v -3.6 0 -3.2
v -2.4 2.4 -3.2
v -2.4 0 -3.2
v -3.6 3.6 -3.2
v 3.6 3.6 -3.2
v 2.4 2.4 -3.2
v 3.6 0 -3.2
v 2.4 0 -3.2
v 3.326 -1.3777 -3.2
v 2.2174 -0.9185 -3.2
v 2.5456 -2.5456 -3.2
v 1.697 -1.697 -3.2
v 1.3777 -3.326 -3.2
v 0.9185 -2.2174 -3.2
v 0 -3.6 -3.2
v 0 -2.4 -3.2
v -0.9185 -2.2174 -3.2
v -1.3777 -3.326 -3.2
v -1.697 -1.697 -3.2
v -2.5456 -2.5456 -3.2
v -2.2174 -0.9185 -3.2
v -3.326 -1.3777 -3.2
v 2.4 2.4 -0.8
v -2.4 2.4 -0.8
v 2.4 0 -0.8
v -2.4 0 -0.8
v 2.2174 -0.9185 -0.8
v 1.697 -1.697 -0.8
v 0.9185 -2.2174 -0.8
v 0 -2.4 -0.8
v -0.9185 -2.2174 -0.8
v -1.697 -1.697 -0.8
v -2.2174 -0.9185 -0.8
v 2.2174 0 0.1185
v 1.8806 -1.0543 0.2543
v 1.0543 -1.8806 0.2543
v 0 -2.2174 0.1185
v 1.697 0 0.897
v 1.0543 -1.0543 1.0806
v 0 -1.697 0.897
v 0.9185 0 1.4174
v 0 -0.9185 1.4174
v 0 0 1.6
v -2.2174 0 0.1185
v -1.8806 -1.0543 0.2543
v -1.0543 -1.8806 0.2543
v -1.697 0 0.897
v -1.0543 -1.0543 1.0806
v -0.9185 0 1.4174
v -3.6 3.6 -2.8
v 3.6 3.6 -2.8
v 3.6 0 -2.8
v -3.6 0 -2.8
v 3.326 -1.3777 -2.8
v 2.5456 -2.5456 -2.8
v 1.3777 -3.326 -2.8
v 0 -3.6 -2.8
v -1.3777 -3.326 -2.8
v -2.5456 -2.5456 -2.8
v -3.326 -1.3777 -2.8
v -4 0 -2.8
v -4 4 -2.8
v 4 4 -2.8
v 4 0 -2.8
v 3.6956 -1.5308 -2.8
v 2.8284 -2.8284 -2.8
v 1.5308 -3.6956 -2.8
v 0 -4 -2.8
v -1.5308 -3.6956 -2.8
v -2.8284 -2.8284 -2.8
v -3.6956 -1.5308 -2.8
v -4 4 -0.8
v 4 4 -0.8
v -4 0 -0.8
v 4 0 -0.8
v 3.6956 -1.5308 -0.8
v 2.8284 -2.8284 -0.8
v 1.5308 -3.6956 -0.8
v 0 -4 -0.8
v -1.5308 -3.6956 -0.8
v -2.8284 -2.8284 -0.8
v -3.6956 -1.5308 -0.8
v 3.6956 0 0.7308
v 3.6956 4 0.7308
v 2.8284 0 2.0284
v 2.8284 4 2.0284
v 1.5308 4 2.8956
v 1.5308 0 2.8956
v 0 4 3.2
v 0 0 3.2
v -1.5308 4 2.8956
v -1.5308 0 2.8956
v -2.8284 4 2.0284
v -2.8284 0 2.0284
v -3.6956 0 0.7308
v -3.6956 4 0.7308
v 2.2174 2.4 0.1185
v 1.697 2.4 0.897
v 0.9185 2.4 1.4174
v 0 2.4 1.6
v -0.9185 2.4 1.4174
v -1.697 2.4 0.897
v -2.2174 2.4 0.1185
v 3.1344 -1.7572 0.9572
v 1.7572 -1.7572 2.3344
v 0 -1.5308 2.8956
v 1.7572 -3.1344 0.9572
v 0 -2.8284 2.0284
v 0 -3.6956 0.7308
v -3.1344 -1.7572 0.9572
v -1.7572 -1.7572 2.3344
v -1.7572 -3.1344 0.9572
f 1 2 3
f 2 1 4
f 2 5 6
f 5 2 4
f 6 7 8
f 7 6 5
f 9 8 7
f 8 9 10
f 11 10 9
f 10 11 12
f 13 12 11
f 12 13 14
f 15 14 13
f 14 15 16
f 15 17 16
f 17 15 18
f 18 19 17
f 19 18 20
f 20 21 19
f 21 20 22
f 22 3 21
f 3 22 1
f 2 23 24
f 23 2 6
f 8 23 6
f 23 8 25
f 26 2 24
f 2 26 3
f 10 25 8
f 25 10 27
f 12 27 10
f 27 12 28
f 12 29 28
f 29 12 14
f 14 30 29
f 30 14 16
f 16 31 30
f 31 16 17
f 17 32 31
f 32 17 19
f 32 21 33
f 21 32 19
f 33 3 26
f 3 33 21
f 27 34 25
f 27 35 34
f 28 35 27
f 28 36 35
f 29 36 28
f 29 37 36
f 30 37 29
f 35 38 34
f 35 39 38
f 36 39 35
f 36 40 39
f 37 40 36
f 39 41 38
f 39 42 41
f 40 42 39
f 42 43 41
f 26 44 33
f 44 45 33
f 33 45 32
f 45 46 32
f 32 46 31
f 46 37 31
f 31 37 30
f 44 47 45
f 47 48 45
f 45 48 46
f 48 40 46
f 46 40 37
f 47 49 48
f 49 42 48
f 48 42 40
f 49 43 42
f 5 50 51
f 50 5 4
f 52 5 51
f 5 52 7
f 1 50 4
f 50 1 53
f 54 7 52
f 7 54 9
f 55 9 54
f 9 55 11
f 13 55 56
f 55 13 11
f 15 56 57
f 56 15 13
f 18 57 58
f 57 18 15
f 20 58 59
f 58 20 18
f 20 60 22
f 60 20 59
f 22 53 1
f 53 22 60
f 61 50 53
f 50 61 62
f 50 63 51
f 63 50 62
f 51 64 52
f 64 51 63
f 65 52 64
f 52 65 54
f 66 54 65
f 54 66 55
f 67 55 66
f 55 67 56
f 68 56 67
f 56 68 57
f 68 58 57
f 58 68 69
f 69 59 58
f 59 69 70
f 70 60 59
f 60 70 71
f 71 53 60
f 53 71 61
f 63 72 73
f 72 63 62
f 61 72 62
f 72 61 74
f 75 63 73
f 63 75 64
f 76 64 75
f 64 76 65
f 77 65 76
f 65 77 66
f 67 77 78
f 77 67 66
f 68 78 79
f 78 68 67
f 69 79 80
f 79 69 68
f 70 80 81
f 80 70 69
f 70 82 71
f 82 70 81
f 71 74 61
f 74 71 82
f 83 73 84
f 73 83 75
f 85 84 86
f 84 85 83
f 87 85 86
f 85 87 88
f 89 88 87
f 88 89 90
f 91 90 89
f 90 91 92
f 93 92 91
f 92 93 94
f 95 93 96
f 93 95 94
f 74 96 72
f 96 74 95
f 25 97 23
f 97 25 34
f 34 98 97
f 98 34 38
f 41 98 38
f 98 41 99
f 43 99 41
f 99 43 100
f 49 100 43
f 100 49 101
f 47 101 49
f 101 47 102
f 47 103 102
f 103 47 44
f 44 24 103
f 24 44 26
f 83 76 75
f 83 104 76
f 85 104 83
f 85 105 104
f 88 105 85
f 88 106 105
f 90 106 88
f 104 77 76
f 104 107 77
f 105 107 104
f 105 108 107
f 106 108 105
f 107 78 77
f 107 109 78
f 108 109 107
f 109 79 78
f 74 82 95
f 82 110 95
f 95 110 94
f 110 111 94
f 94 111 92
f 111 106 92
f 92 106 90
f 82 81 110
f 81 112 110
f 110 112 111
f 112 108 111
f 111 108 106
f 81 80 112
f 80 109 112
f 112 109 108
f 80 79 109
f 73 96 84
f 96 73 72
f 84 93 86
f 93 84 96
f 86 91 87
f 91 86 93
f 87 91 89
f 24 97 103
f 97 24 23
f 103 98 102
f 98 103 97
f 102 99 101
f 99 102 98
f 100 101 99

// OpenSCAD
// file: ../p/1-8sphe.scad
use <../lib.scad>
function ldraw_lib__1_8sphe() = [
// 0 Sphere 0.125
// 0 Name: 1-8sphe.dat
// 0 Author: James Jessiman
// 0 !LDRAW_ORG Primitive UPDATE 2012-03
// 0 !LICENSE Licensed under CC BY 4.0 : see CAreadme.txt
// 
// 0 BFC CERTIFY CCW
  [0,"BFC","CERTIFY"],
  [0,"BFC","CCW"],
// 
// 0 !HISTORY 2000-08-01 {Axel Poque} fixes to resolve L3P error messages.
// 0 !HISTORY 2000-08-01 {Manfred Moolhuysen} fixes to resolve L3P error messages.
// 0 !HISTORY 2000-09-30 [PTadmin] Official Update 2000-02
// 0 !HISTORY 2002-03-28 [hafhead] Made BFC compliant
// 0 !HISTORY 2002-04-25 [PTadmin] Official Update 2002-02
// 0 !HISTORY 2007-06-22 [PTadmin] Header formatted for Contributor Agreement
// 0 !HISTORY 2008-07-01 [PTadmin] Official Update 2008-01
// 0 !HISTORY 2010-09-12 [MagFors] Changed winding, removed duplicated cond-line, optimized filesize
// 0 !HISTORY 2010-12-31 [PTadmin] Official Update 2010-03
// 0 !HISTORY 2012-07-01 [tcobbs] Replaced with geometry from LDView
// 0 !HISTORY 2012-12-28 [PTadmin] Official Update 2012-03
// 
// 
// 3 16 1 0 0 0.9239 0.3827 0 0.9239 0 0.3827
  [3,16,1,0,0,0.9239,0.3827,0,0.9239,0,0.3827],
// 3 16 0.9239 0.3827 0 0.7836 0.4393 0.4393 0.9239 0 0.3827
  [3,16,0.9239,0.3827,0,0.7836,0.4393,0.4393,0.9239,0,0.3827],
// 3 16 0.9239 0 0.3827 0.7836 0.4393 0.4393 0.7071 0 0.7071
  [3,16,0.9239,0,0.3827,0.7836,0.4393,0.4393,0.7071,0,0.7071],
// 3 16 0.7836 0.4393 0.4393 0.4393 0.4393 0.7836 0.7071 0 0.7071
  [3,16,0.7836,0.4393,0.4393,0.4393,0.4393,0.7836,0.7071,0,0.7071],
// 3 16 0.7071 0 0.7071 0.4393 0.4393 0.7836 0.3827 0 0.9239
  [3,16,0.7071,0,0.7071,0.4393,0.4393,0.7836,0.3827,0,0.9239],
// 3 16 0.4393 0.4393 0.7836 0 0.3827 0.9239 0.3827 0 0.9239
  [3,16,0.4393,0.4393,0.7836,0,0.3827,0.9239,0.3827,0,0.9239],
// 3 16 0.3827 0 0.9239 0 0.3827 0.9239 0 0 1
  [3,16,0.3827,0,0.9239,0,0.3827,0.9239,0,0,1],
// 3 16 0.9239 0.3827 0 0.7071 0.7071 0 0.7836 0.4393 0.4393
  [3,16,0.9239,0.3827,0,0.7071,0.7071,0,0.7836,0.4393,0.4393],
// 3 16 0.7071 0.7071 0 0.4393 0.7836 0.4393 0.7836 0.4393 0.4393
  [3,16,0.7071,0.7071,0,0.4393,0.7836,0.4393,0.7836,0.4393,0.4393],
// 3 16 0.7836 0.4393 0.4393 0.4393 0.7836 0.4393 0.4393 0.4393 0.7836
  [3,16,0.7836,0.4393,0.4393,0.4393,0.7836,0.4393,0.4393,0.4393,0.7836],
// 3 16 0.4393 0.7836 0.4393 0 0.7071 0.7071 0.4393 0.4393 0.7836
  [3,16,0.4393,0.7836,0.4393,0,0.7071,0.7071,0.4393,0.4393,0.7836],
// 3 16 0.4393 0.4393 0.7836 0 0.7071 0.7071 0 0.3827 0.9239
  [3,16,0.4393,0.4393,0.7836,0,0.7071,0.7071,0,0.3827,0.9239],
// 3 16 0.7071 0.7071 0 0.3827 0.9239 0 0.4393 0.7836 0.4393
  [3,16,0.7071,0.7071,0,0.3827,0.9239,0,0.4393,0.7836,0.4393],
// 3 16 0.3827 0.9239 0 0 0.9239 0.3827 0.4393 0.7836 0.4393
  [3,16,0.3827,0.9239,0,0,0.9239,0.3827,0.4393,0.7836,0.4393],
// 3 16 0.4393 0.7836 0.4393 0 0.9239 0.3827 0 0.7071 0.7071
  [3,16,0.4393,0.7836,0.4393,0,0.9239,0.3827,0,0.7071,0.7071],
// 3 16 0.3827 0.9239 0 0 1 0 0 0.9239 0.3827
  [3,16,0.3827,0.9239,0,0,1,0,0,0.9239,0.3827],
// 
// 5 24 1 0 0 0.9239 0.3827 0 1 0 -0.1 0.9239 0 0.3827
  [5,24,1,0,0,0.9239,0.3827,0,1,0,-0.1,0.9239,0,0.3827],
// 5 24 0.9239 0.3827 0 0.9239 0 0.3827 1 0 0 0.7836 0.4393 0.4393
  [5,24,0.9239,0.3827,0,0.9239,0,0.3827,1,0,0,0.7836,0.4393,0.4393],
// 5 24 1 0 0 0.9239 0 0.3827 0.9239 0.3827 0 1 -0.1 0
  [5,24,1,0,0,0.9239,0,0.3827,0.9239,0.3827,0,1,-0.1,0],
// 5 24 0.9239 0 0.3827 0.7836 0.4393 0.4393 0.9239 0.3827 0 0.7071 0 0.7071
  [5,24,0.9239,0,0.3827,0.7836,0.4393,0.4393,0.9239,0.3827,0,0.7071,0,0.7071],
// 5 24 0.7836 0.4393 0.4393 0.7071 0 0.7071 0.9239 0 0.3827 0.4393 0.4393 0.7836
  [5,24,0.7836,0.4393,0.4393,0.7071,0,0.7071,0.9239,0,0.3827,0.4393,0.4393,0.7836],
// 5 24 0.9239 0 0.3827 0.7071 0 0.7071 0.7836 0.4393 0.4393 0.9239 -0.1 0.3827
  [5,24,0.9239,0,0.3827,0.7071,0,0.7071,0.7836,0.4393,0.4393,0.9239,-0.1,0.3827],
// 5 24 0.7071 0 0.7071 0.4393 0.4393 0.7836 0.7836 0.4393 0.4393 0.3827 0 0.9239
  [5,24,0.7071,0,0.7071,0.4393,0.4393,0.7836,0.7836,0.4393,0.4393,0.3827,0,0.9239],
// 5 24 0.4393 0.4393 0.7836 0.3827 0 0.9239 0.7071 0 0.7071 0 0.3827 0.9239
  [5,24,0.4393,0.4393,0.7836,0.3827,0,0.9239,0.7071,0,0.7071,0,0.3827,0.9239],
// 5 24 0.7071 0 0.7071 0.3827 0 0.9239 0.4393 0.4393 0.7836 0.7071 -0.1 0.7071
  [5,24,0.7071,0,0.7071,0.3827,0,0.9239,0.4393,0.4393,0.7836,0.7071,-0.1,0.7071],
// 5 24 0.3827 0 0.9239 0 0.3827 0.9239 0.4393 0.4393 0.7836 0 0 1
  [5,24,0.3827,0,0.9239,0,0.3827,0.9239,0.4393,0.4393,0.7836,0,0,1],
// 5 24 0 0.3827 0.9239 0 0 1 0.3827 0 0.9239 -0.1 0.3827 0.9239
  [5,24,0,0.3827,0.9239,0,0,1,0.3827,0,0.9239,-0.1,0.3827,0.9239],
// 5 24 0.3827 0 0.9239 0 0 1 0 0.3827 0.9239 0.3827 -0.1 0.9239
  [5,24,0.3827,0,0.9239,0,0,1,0,0.3827,0.9239,0.3827,-0.1,0.9239],
// 5 24 0.9239 0.3827 0 0.7071 0.7071 0 0.9239 0.3827 -0.1 0.7836 0.4393 0.4393
  [5,24,0.9239,0.3827,0,0.7071,0.7071,0,0.9239,0.3827,-0.1,0.7836,0.4393,0.4393],
// 5 24 0.7071 0.7071 0 0.7836 0.4393 0.4393 0.9239 0.3827 0 0.4393 0.7836 0.4393
  [5,24,0.7071,0.7071,0,0.7836,0.4393,0.4393,0.9239,0.3827,0,0.4393,0.7836,0.4393],
// 5 24 0.9239 0.3827 0 0.7836 0.4393 0.4393 0.7071 0.7071 0 0.9239 0 0.3827
  [5,24,0.9239,0.3827,0,0.7836,0.4393,0.4393,0.7071,0.7071,0,0.9239,0,0.3827],
// 5 24 0.7836 0.4393 0.4393 0.4393 0.7836 0.4393 0.7071 0.7071 0 0.4393 0.4393 0.7836
  [5,24,0.7836,0.4393,0.4393,0.4393,0.7836,0.4393,0.7071,0.7071,0,0.4393,0.4393,0.7836],
// 5 24 0.4393 0.7836 0.4393 0.4393 0.4393 0.7836 0.7836 0.4393 0.4393 0 0.7071 0.7071
  [5,24,0.4393,0.7836,0.4393,0.4393,0.4393,0.7836,0.7836,0.4393,0.4393,0,0.7071,0.7071],
// 5 24 0.7836 0.4393 0.4393 0.4393 0.4393 0.7836 0.4393 0.7836 0.4393 0.7071 0 0.7071
  [5,24,0.7836,0.4393,0.4393,0.4393,0.4393,0.7836,0.4393,0.7836,0.4393,0.7071,0,0.7071],
// 5 24 0.4393 0.4393 0.7836 0 0.7071 0.7071 0.4393 0.7836 0.4393 0 0.3827 0.9239
  [5,24,0.4393,0.4393,0.7836,0,0.7071,0.7071,0.4393,0.7836,0.4393,0,0.3827,0.9239],
// 5 24 0 0.7071 0.7071 0 0.3827 0.9239 0.4393 0.4393 0.7836 -0.1 0.7071 0.7071
  [5,24,0,0.7071,0.7071,0,0.3827,0.9239,0.4393,0.4393,0.7836,-0.1,0.7071,0.7071],
// 5 24 0.4393 0.4393 0.7836 0 0.3827 0.9239 0 0.7071 0.7071 0.3827 0 0.9239
  [5,24,0.4393,0.4393,0.7836,0,0.3827,0.9239,0,0.7071,0.7071,0.3827,0,0.9239],
// 5 24 0.7071 0.7071 0 0.3827 0.9239 0 0.7071 0.7071 -0.1 0.4393 0.7836 0.4393
  [5,24,0.7071,0.7071,0,0.3827,0.9239,0,0.7071,0.7071,-0.1,0.4393,0.7836,0.4393],
// 5 24 0.3827 0.9239 0 0.4393 0.7836 0.4393 0.7071 0.7071 0 0 0.9239 0.3827
  [5,24,0.3827,0.9239,0,0.4393,0.7836,0.4393,0.7071,0.7071,0,0,0.9239,0.3827],
// 5 24 0.7071 0.7071 0 0.4393 0.7836 0.4393 0.3827 0.9239 0 0.7836 0.4393 0.4393
  [5,24,0.7071,0.7071,0,0.4393,0.7836,0.4393,0.3827,0.9239,0,0.7836,0.4393,0.4393],
// 5 24 0.4393 0.7836 0.4393 0 0.9239 0.3827 0.3827 0.9239 0 0 0.7071 0.7071
  [5,24,0.4393,0.7836,0.4393,0,0.9239,0.3827,0.3827,0.9239,0,0,0.7071,0.7071],
// 5 24 0 0.9239 0.3827 0 0.7071 0.7071 0.4393 0.7836 0.4393 -0.1 0.9239 0.3827
  [5,24,0,0.9239,0.3827,0,0.7071,0.7071,0.4393,0.7836,0.4393,-0.1,0.9239,0.3827],
// 5 24 0.4393 0.7836 0.4393 0 0.7071 0.7071 0 0.9239 0.3827 0.4393 0.4393 0.7836
  [5,24,0.4393,0.7836,0.4393,0,0.7071,0.7071,0,0.9239,0.3827,0.4393,0.4393,0.7836],
// 5 24 0.3827 0.9239 0 0 1 0 0.3827 0.9239 -0.1 0 0.9239 0.3827
  [5,24,0.3827,0.9239,0,0,1,0,0.3827,0.9239,-0.1,0,0.9239,0.3827],
// 5 24 0 1 0 0 0.9239 0.3827 0.3827 0.9239 0 -0.1 1 0
  [5,24,0,1,0,0,0.9239,0.3827,0.3827,0.9239,0,-0.1,1,0],
// 5 24 0.3827 0.9239 0 0 0.9239 0.3827 0 1 0 0.4393 0.7836 0.4393
  [5,24,0.3827,0.9239,0,0,0.9239,0.3827,0,1,0,0.4393,0.7836,0.4393],
];
module ldraw_lib__1_8sphe(step=0, col=false, unit=2/5, alt=false, line=0.2, solid=!$preview)
    makepoly(ldraw_lib__1_8sphe(), step=step, col=col, unit=unit, alt=alt, line=line, solid=solid);
ldraw_lib__1_8sphe(line=0.2);
// file: ../p/box3u7a.scad
use <../lib.scad>
function ldraw_lib__box3u7a() = [
// 0 Box with 3 Faces without 7 Adjacent Edges
// 0 Name: box3u7a.dat
// 0 Author: Chris Dee [cwdee]
// 0 !LDRAW_ORG Primitive UPDATE 2009-02
// 0 !LICENSE Licensed under CC BY 4.0 : see CAreadme.txt
// 
// 0 BFC CERTIFY CCW
  [0,"BFC","CERTIFY"],
  [0,"BFC","CCW"],
// 
// 0 !HISTORY 2009-09-03 [PTadmin] Official Update 2009-02
// 
// 
// 2 24 1 1 1 -1 1 1
  [2,24,1,1,1,-1,1,1],
// 2 24 -1 1 -1 1 1 -1
  [2,24,-1,1,-1,1,1,-1],
// 2 24 -1 1 1 -1 1 -1
  [2,24,-1,1,1,-1,1,-1],
// 2 24 -1 1 1 -1 0 1
  [2,24,-1,1,1,-1,0,1],
// 2 24 -1 1 -1 -1 0 -1
  [2,24,-1,1,-1,-1,0,-1],
// 4 16 1 1 -1 -1 1 -1 -1 1 1 1 1 1
  [4,16,1,1,-1,-1,1,-1,-1,1,1,1,1,1],
// 4 16 1 1 1 -1 1 1 -1 0 1 1 0 1
  [4,16,1,1,1,-1,1,1,-1,0,1,1,0,1],
// 4 16 -1 1 -1 1 1 -1 1 0 -1 -1 0 -1
  [4,16,-1,1,-1,1,1,-1,1,0,-1,-1,0,-1],
// 0
];
module ldraw_lib__box3u7a(step=0, col=false, unit=2/5, alt=false, line=0.2, solid=!$preview)
    makepoly(ldraw_lib__box3u7a(), step=step, col=col, unit=unit, alt=alt, line=line, solid=solid);
ldraw_lib__box3u7a(line=0.2);
// file: ../p/box3u4a.scad
use <../lib.scad>
function ldraw_lib__box3u4a() = [
// 0 Box with 3 Faces without 4 Adjacent Edges
// 0 Name: box3u4a.dat
// 0 Author: Niels Karsdorp [nielsk]
// 0 !LDRAW_ORG Primitive UPDATE 2009-01
// 0 !LICENSE Licensed under CC BY 4.0 : see CAreadme.txt
// 
// 0 BFC CERTIFY CCW
  [0,"BFC","CERTIFY"],
  [0,"BFC","CCW"],
// 
// 0 !HISTORY 2009-05-02 [PTadmin] Official Update 2009-01
// 
// 
// 2 24 1 1 1 -1 1 1
  [2,24,1,1,1,-1,1,1],
// 2 24 -1 1 -1 1 1 -1
  [2,24,-1,1,-1,1,1,-1],
// 2 24 1 1 1 1 1 -1
  [2,24,1,1,1,1,1,-1],
// 2 24 -1 1 1 -1 1 -1
  [2,24,-1,1,1,-1,1,-1],
// 2 24 1 1 1 1 0 1
  [2,24,1,1,1,1,0,1],
// 2 24 1 1 -1 1 0 -1
  [2,24,1,1,-1,1,0,-1],
// 2 24 -1 1 1 -1 0 1
  [2,24,-1,1,1,-1,0,1],
// 2 24 -1 1 -1 -1 0 -1
  [2,24,-1,1,-1,-1,0,-1],
// 4 16 -1 1 -1 -1 1 1 1 1 1 1 1 -1
  [4,16,-1,1,-1,-1,1,1,1,1,1,1,1,-1],
// 4 16 -1 1 1 -1 0 1 1 0 1 1 1 1
  [4,16,-1,1,1,-1,0,1,1,0,1,1,1,1],
// 4 16 1 1 -1 1 0 -1 -1 0 -1 -1 1 -1
  [4,16,1,1,-1,1,0,-1,-1,0,-1,-1,1,-1],
// 0
];
module ldraw_lib__box3u4a(step=0, col=false, unit=2/5, alt=false, line=0.2, solid=!$preview)
    makepoly(ldraw_lib__box3u4a(), step=step, col=col, unit=unit, alt=alt, line=line, solid=solid);
ldraw_lib__box3u4a(line=0.2);
// file: ../p/2-8sphe.scad
use <../lib.scad>
use <1-8sphe.scad>
function ldraw_lib__2_8sphe() = [
// 0 Sphere 0.25
// 0 Name: 2-8sphe.dat
// 0 Author: James Jessiman
// 0 !LDRAW_ORG Primitive UPDATE 2003-02
// 0 !LICENSE Licensed under CC BY 4.0 : see CAreadme.txt
// 
// 0 BFC CERTIFY CCW
  [0,"BFC","CERTIFY"],
  [0,"BFC","CCW"],
// 
// 0 !HISTORY 2002-08-31 [izanette] Modified with WINDZ for BFC compliance
// 0 !HISTORY 2003-08-01 [PTadmin] Official Update 2003-02
// 0 !HISTORY 2007-06-24 [PTadmin] Header formatted for Contributor Agreement
// 0 !HISTORY 2008-07-01 [PTadmin] Official Update 2008-01
// 
// 
// 1 16 0 0 0 1 0 0 0 1 0 0 0 1 1-8sphe.dat
  [1,16,0,0,0,1,0,0,0,1,0,0,0,1, ldraw_lib__1_8sphe()],
// 1 16 0 0 0 -1 0 0 0 1 0 0 0 1 1-8sphe.dat
  [1,16,0,0,0,-1,0,0,0,1,0,0,0,1, ldraw_lib__1_8sphe()],
// 0
// 
];
module ldraw_lib__2_8sphe(step=0, col=false, unit=2/5, alt=false, line=0.2, solid=!$preview)
    makepoly(ldraw_lib__2_8sphe(), step=step, col=col, unit=unit, alt=alt, line=line, solid=solid);
ldraw_lib__2_8sphe(line=0.2);
// file: ../p/2-4ring9.scad
use <../lib.scad>
function ldraw_lib__2_4ring9() = [
// 0 Ring  9 x 0.5
// 0 Name: 2-4ring9.dat
// 0 Author: Willy Tschager [Holly-Wood]
// 0 !LDRAW_ORG Primitive UPDATE 2024-01
// 0 !LICENSE Licensed under CC BY 4.0 : see CAreadme.txt
// 
// 0 BFC CERTIFY CCW
  [0,"BFC","CERTIFY"],
  [0,"BFC","CCW"],
// 
// 0 !HISTORY 2009-09-03 [PTadmin] Official Update 2009-02
// 0 !HISTORY 2024-01-10 [Holly-Wood] Complete regeneration, original by guyvivan
// 0 !HISTORY 2024-01-29 [OrionP] Official Update 2024-01
// 
// 4 16 10 0 0 9.239 0 3.827 8.3151 0 3.4443 9 0 0
  [4,16,10,0,0,9.239,0,3.827,8.3151,0,3.4443,9,0,0],
// 4 16 9.239 0 3.827 7.071 0 7.071 6.3639 0 6.3639 8.3151 0 3.4443
  [4,16,9.239,0,3.827,7.071,0,7.071,6.3639,0,6.3639,8.3151,0,3.4443],
// 4 16 7.071 0 7.071 3.827 0 9.239 3.4443 0 8.3151 6.3639 0 6.3639
  [4,16,7.071,0,7.071,3.827,0,9.239,3.4443,0,8.3151,6.3639,0,6.3639],
// 4 16 3.827 0 9.239 0 0 10 0 0 9 3.4443 0 8.3151
  [4,16,3.827,0,9.239,0,0,10,0,0,9,3.4443,0,8.3151],
// 4 16 0 0 10 -3.827 0 9.239 -3.4443 0 8.3151 0 0 9
  [4,16,0,0,10,-3.827,0,9.239,-3.4443,0,8.3151,0,0,9],
// 4 16 -3.827 0 9.239 -7.071 0 7.071 -6.3639 0 6.3639 -3.4443 0 8.3151
  [4,16,-3.827,0,9.239,-7.071,0,7.071,-6.3639,0,6.3639,-3.4443,0,8.3151],
// 4 16 -7.071 0 7.071 -9.239 0 3.827 -8.3151 0 3.4443 -6.3639 0 6.3639
  [4,16,-7.071,0,7.071,-9.239,0,3.827,-8.3151,0,3.4443,-6.3639,0,6.3639],
// 4 16 -9.239 0 3.827 -10 0 0 -9 0 0 -8.3151 0 3.4443
  [4,16,-9.239,0,3.827,-10,0,0,-9,0,0,-8.3151,0,3.4443],
// 0 // Build by LDPartEditor (PrimGen 2.X)
];
module ldraw_lib__2_4ring9(step=0, col=false, unit=2/5, alt=false, line=0.2, solid=!$preview)
    makepoly(ldraw_lib__2_4ring9(), step=step, col=col, unit=unit, alt=alt, line=line, solid=solid);
ldraw_lib__2_4ring9(line=0.2);
// file: ../p/2-4ring2.scad
use <../lib.scad>
function ldraw_lib__2_4ring2() = [
// 0 Ring  2 x 0.5
// 0 Name: 2-4ring2.dat
// 0 Author: Chris Dee [cwdee]
// 0 !LDRAW_ORG Primitive UPDATE 2012-01
// 0 !LICENSE Licensed under CC BY 4.0 : see CAreadme.txt
// 
// 0 BFC CERTIFY CCW
  [0,"BFC","CERTIFY"],
  [0,"BFC","CCW"],
// 
// 0 !HISTORY 2001-10-26 [PTadmin] Official Update 2001-01
// 0 !HISTORY 2007-06-24 [PTadmin] Header formatted for Contributor Agreement
// 0 !HISTORY 2008-07-01 [PTadmin] Official Update 2008-01
// 0 !HISTORY 2012-02-16 [Philo] Changed to CCW
// 0 !HISTORY 2012-03-30 [PTadmin] Official Update 2012-01
// 
// 
// 4 16 3 0 0 2.7717 0 1.1481 1.8478 0 0.7654 2 0 0
  [4,16,3,0,0,2.7717,0,1.1481,1.8478,0,0.7654,2,0,0],
// 4 16 2.7717 0 1.1481 2.1213 0 2.1213 1.4142 0 1.4142 1.8478 0 0.7654
  [4,16,2.7717,0,1.1481,2.1213,0,2.1213,1.4142,0,1.4142,1.8478,0,0.7654],
// 4 16 2.1213 0 2.1213 1.1481 0 2.7717 0.7654 0 1.8478 1.4142 0 1.4142
  [4,16,2.1213,0,2.1213,1.1481,0,2.7717,0.7654,0,1.8478,1.4142,0,1.4142],
// 4 16 1.1481 0 2.7717 0 0 3 0 0 2 0.7654 0 1.8478
  [4,16,1.1481,0,2.7717,0,0,3,0,0,2,0.7654,0,1.8478],
// 4 16 0 0 3 -1.1481 0 2.7717 -0.7654 0 1.8478 0 0 2
  [4,16,0,0,3,-1.1481,0,2.7717,-0.7654,0,1.8478,0,0,2],
// 4 16 -1.1481 0 2.7717 -2.1213 0 2.1213 -1.4142 0 1.4142 -0.7654 0 1.8478
  [4,16,-1.1481,0,2.7717,-2.1213,0,2.1213,-1.4142,0,1.4142,-0.7654,0,1.8478],
// 4 16 -2.1213 0 2.1213 -2.7717 0 1.1481 -1.8478 0 0.7654 -1.4142 0 1.4142
  [4,16,-2.1213,0,2.1213,-2.7717,0,1.1481,-1.8478,0,0.7654,-1.4142,0,1.4142],
// 4 16 -2.7717 0 1.1481 -3 0 0 -2 0 0 -1.8478 0 0.7654
  [4,16,-2.7717,0,1.1481,-3,0,0,-2,0,0,-1.8478,0,0.7654],
];
module ldraw_lib__2_4ring2(step=0, col=false, unit=2/5, alt=false, line=0.2, solid=!$preview)
    makepoly(ldraw_lib__2_4ring2(), step=step, col=col, unit=unit, alt=alt, line=line, solid=solid);
ldraw_lib__2_4ring2(line=0.2);
// file: ../p/2-4edge.scad
use <../lib.scad>
function ldraw_lib__2_4edge() = [
// 0 Circle 0.5
// 0 Name: 2-4edge.dat
// 0 Author: James Jessiman
// 0 !LDRAW_ORG Primitive UPDATE 2017-01
// 0 !LICENSE Licensed under CC BY 4.0 : see CAreadme.txt
// 
// 0 BFC CERTIFY CCW
  [0,"BFC","CERTIFY"],
  [0,"BFC","CCW"],
// 
// 0 !HISTORY 2007-06-24 [PTadmin] Header formatted for Contributor Agreement
// 0 !HISTORY 2008-07-01 [PTadmin] Official Update 2008-01
// 0 !HISTORY 2017-01-15 [Steffen] BFCed
// 0 !HISTORY 2017-12-30 [PTadmin] Official Update 2017-01
// 
// 
// 2 24 1 0 0 0.9239 0 0.3827
  [2,24,1,0,0,0.9239,0,0.3827],
// 2 24 0.9239 0 0.3827 0.7071 0 0.7071
  [2,24,0.9239,0,0.3827,0.7071,0,0.7071],
// 2 24 0.7071 0 0.7071 0.3827 0 0.9239
  [2,24,0.7071,0,0.7071,0.3827,0,0.9239],
// 2 24 0.3827 0 0.9239 0 0 1
  [2,24,0.3827,0,0.9239,0,0,1],
// 2 24 0 0 1 -0.3827 0 0.9239
  [2,24,0,0,1,-0.3827,0,0.9239],
// 2 24 -0.3827 0 0.9239 -0.7071 0 0.7071
  [2,24,-0.3827,0,0.9239,-0.7071,0,0.7071],
// 2 24 -0.7071 0 0.7071 -0.9239 0 0.3827
  [2,24,-0.7071,0,0.7071,-0.9239,0,0.3827],
// 2 24 -0.9239 0 0.3827 -1 0 0
  [2,24,-0.9239,0,0.3827,-1,0,0],
];
module ldraw_lib__2_4edge(step=0, col=false, unit=2/5, alt=false, line=0.2, solid=!$preview)
    makepoly(ldraw_lib__2_4edge(), step=step, col=col, unit=unit, alt=alt, line=line, solid=solid);
ldraw_lib__2_4edge(line=0.2);
// file: ../p/2-4cylo.scad
use <../lib.scad>
use <2-4cyli.scad>
use <2-4edge.scad>
function ldraw_lib__2_4cylo() = [
// 0 Cylinder Open 0.5
// 0 Name: 2-4cylo.dat
// 0 Author: Max Martin Richter [MMR1988]
// 0 !LDRAW_ORG Primitive UPDATE 2010-03
// 0 !LICENSE Licensed under CC BY 4.0 : see CAreadme.txt
// 
// 0 BFC CERTIFY CCW
  [0,"BFC","CERTIFY"],
  [0,"BFC","CCW"],
// 
// 0 !HISTORY 2010-12-31 [PTadmin] Official Update 2010-03
// 
// 
// 1 16 0 0 0 1 0 0 0 1 0 0 0 1 2-4edge.dat
  [1,16,0,0,0,1,0,0,0,1,0,0,0,1, ldraw_lib__2_4edge()],
// 1 16 0 1 0 1 0 0 0 1 0 0 0 1 2-4edge.dat
  [1,16,0,1,0,1,0,0,0,1,0,0,0,1, ldraw_lib__2_4edge()],
// 1 16 0 0 0 1 0 0 0 1 0 0 0 1 2-4cyli.dat
  [1,16,0,0,0,1,0,0,0,1,0,0,0,1, ldraw_lib__2_4cyli()],
];
module ldraw_lib__2_4cylo(step=0, col=false, unit=2/5, alt=false, line=0.2, solid=!$preview)
    makepoly(ldraw_lib__2_4cylo(), step=step, col=col, unit=unit, alt=alt, line=line, solid=solid);
ldraw_lib__2_4cylo(line=0.2);
// file: ../p/2-4cyli.scad
use <../lib.scad>
function ldraw_lib__2_4cyli() = [
// 0 Cylinder 0.5
// 0 Name: 2-4cyli.dat
// 0 Author: James Jessiman
// 0 !LDRAW_ORG Primitive UPDATE 2005-01
// 0 !LICENSE Licensed under CC BY 4.0 : see CAreadme.txt
// 
// 0 BFC CERTIFY CCW
  [0,"BFC","CERTIFY"],
  [0,"BFC","CCW"],
// 
// 0 !HISTORY 2002-03-23 [sbliss] Added BFC statement; compacted code
// 0 !HISTORY 2002-04-25 [PTadmin] Official Update 2002-02
// 0 !HISTORY 2004-12-11 [nielsk] Recreated using Primitive Generator, Edge lines fixed, BFC changed to CCW
// 0 !HISTORY 2005-12-28 [PTadmin] Official Update 2005-01
// 0 !HISTORY 2007-06-24 [PTadmin] Header formatted for Contributor Agreement
// 0 !HISTORY 2008-07-01 [PTadmin] Official Update 2008-01
// 
// 
// 4 16 .9239 1 .3827 .9239 0 .3827 1 0 0 1 1 0
  [4,16,.9239,1,.3827,.9239,0,.3827,1,0,0,1,1,0],
// 4 16 .7071 1 .7071 .7071 0 .7071 .9239 0 .3827 .9239 1 .3827
  [4,16,.7071,1,.7071,.7071,0,.7071,.9239,0,.3827,.9239,1,.3827],
// 4 16 .3827 1 .9239 .3827 0 .9239 .7071 0 .7071 .7071 1 .7071
  [4,16,.3827,1,.9239,.3827,0,.9239,.7071,0,.7071,.7071,1,.7071],
// 4 16 0 1 1 0 0 1 .3827 0 .9239 .3827 1 .9239
  [4,16,0,1,1,0,0,1,.3827,0,.9239,.3827,1,.9239],
// 4 16 -.3827 1 .9239 -.3827 0 .9239 0 0 1 0 1 1
  [4,16,-.3827,1,.9239,-.3827,0,.9239,0,0,1,0,1,1],
// 4 16 -.7071 1 .7071 -.7071 0 .7071 -.3827 0 .9239 -.3827 1 .9239
  [4,16,-.7071,1,.7071,-.7071,0,.7071,-.3827,0,.9239,-.3827,1,.9239],
// 4 16 -.9239 1 .3827 -.9239 0 .3827 -.7071 0 .7071 -.7071 1 .7071
  [4,16,-.9239,1,.3827,-.9239,0,.3827,-.7071,0,.7071,-.7071,1,.7071],
// 4 16 -1 1 0 -1 0 0 -.9239 0 .3827 -.9239 1 .3827
  [4,16,-1,1,0,-1,0,0,-.9239,0,.3827,-.9239,1,.3827],
// 5 24 1 1 0 1 0 0 1 1 -.4142 .9239 1 .3827
  [5,24,1,1,0,1,0,0,1,1,-.4142,.9239,1,.3827],
// 5 24 .9239 1 .3827 .9239 0 .3827 1 1 0 .7071 1 .7071
  [5,24,.9239,1,.3827,.9239,0,.3827,1,1,0,.7071,1,.7071],
// 5 24 .7071 1 .7071 .7071 0 .7071 .9239 1 .3827 .3827 1 .9239
  [5,24,.7071,1,.7071,.7071,0,.7071,.9239,1,.3827,.3827,1,.9239],
// 5 24 .3827 1 .9239 .3827 0 .9239 .7071 1 .7071 0 1 1
  [5,24,.3827,1,.9239,.3827,0,.9239,.7071,1,.7071,0,1,1],
// 5 24 0 1 1 0 0 1 .3827 1 .9239 -.3827 1 .9239
  [5,24,0,1,1,0,0,1,.3827,1,.9239,-.3827,1,.9239],
// 5 24 -.3827 1 .9239 -.3827 0 .9239 0 1 1 -.7071 1 .7071
  [5,24,-.3827,1,.9239,-.3827,0,.9239,0,1,1,-.7071,1,.7071],
// 5 24 -.7071 1 .7071 -.7071 0 .7071 -.3827 1 .9239 -.9239 1 .3827
  [5,24,-.7071,1,.7071,-.7071,0,.7071,-.3827,1,.9239,-.9239,1,.3827],
// 5 24 -.9239 1 .3827 -.9239 0 .3827 -.7071 1 .7071 -1 1 0
  [5,24,-.9239,1,.3827,-.9239,0,.3827,-.7071,1,.7071,-1,1,0],
// 5 24 -1 1 0 -1 0 0 -.9239 1 .3827 -1 1 -.4142
  [5,24,-1,1,0,-1,0,0,-.9239,1,.3827,-1,1,-.4142],
// 0
];
module ldraw_lib__2_4cyli(step=0, col=false, unit=2/5, alt=false, line=0.2, solid=!$preview)
    makepoly(ldraw_lib__2_4cyli(), step=step, col=col, unit=unit, alt=alt, line=line, solid=solid);
ldraw_lib__2_4cyli(line=0.2);
// file: ../p/2-4chrd.scad
use <../lib.scad>
function ldraw_lib__2_4chrd() = [
// 0 Chord 0.5
// 0 Name: 2-4chrd.dat
// 0 Author: Philippe Hurbain [Philo]
// 0 !LDRAW_ORG Primitive UPDATE 2014-01
// 0 !LICENSE Licensed under CC BY 4.0 : see CAreadme.txt
// 
// 0 BFC CERTIFY CCW
  [0,"BFC","CERTIFY"],
  [0,"BFC","CCW"],
// 
// 0 !HISTORY 2014-06-21 [PTadmin] Official Update 2014-01
// 
// 
// 4 16 0.9239 0 0.3827 -0.9239 0 0.3827 -1 0 0 1 0 0
  [4,16,0.9239,0,0.3827,-0.9239,0,0.3827,-1,0,0,1,0,0],
// 4 16 0.7071 0 0.7071 -0.7071 0 0.7071 -0.9239 0 0.3827 0.9239 0 0.3827
  [4,16,0.7071,0,0.7071,-0.7071,0,0.7071,-0.9239,0,0.3827,0.9239,0,0.3827],
// 4 16 0.3827 0 0.9239 -0.3827 0 0.9239 -0.7071 0 0.7071 0.7071 0 0.7071
  [4,16,0.3827,0,0.9239,-0.3827,0,0.9239,-0.7071,0,0.7071,0.7071,0,0.7071],
// 3 16 0 0 1 -0.3827 0 0.9239 0.3827 0 0.9239
  [3,16,0,0,1,-0.3827,0,0.9239,0.3827,0,0.9239],
];
module ldraw_lib__2_4chrd(step=0, col=false, unit=2/5, alt=false, line=0.2, solid=!$preview)
    makepoly(ldraw_lib__2_4chrd(), step=step, col=col, unit=unit, alt=alt, line=line, solid=solid);
ldraw_lib__2_4chrd(line=0.2);
// main file
use <../lib.scad>
use <../p/2-4chrd.scad>
use <../p/2-4cyli.scad>
use <../p/2-4cylo.scad>
use <../p/2-4edge.scad>
use <../p/2-4ring2.scad>
use <../p/2-4ring9.scad>
use <../p/2-8sphe.scad>
use <../p/box3u4a.scad>
use <../p/box3u7a.scad>
function ldraw_lib__7818() = [
// 0 Brick  1 x  1 x  0.667 with Curved Top Corner
// 0 Name: 7818.dat
// 0 Author: Magnus Forsberg [MagFors]
// 0 !LDRAW_ORG Part UPDATE 2026-06
// 0 !LICENSE Licensed under CC BY 4.0 : see CAreadme.txt
// 
// 0 BFC CERTIFY CCW
  [0,"BFC","CERTIFY"],
  [0,"BFC","CCW"],
// 
// 0 !KEYWORDS Brickowl 1222970
// 
// 0 !HISTORY 2026-06-28 [OrionP] Official Update 2026-06
// 
// 4 16 -9 8 0 -9 8 9 -6 8 6 -6 8 0
  [4,16,-9,8,0,-9,8,9,-6,8,6,-6,8,0],
// 4 16 -9 8 9 9 8 9 6 8 6 -6 8 6
  [4,16,-9,8,9,9,8,9,6,8,6,-6,8,6],
// 4 16 9 8 9 9 8 0 6 8 0 6 8 6
  [4,16,9,8,9,9,8,0,6,8,0,6,8,6],
// 1 16 0 8 0 3 0 0 0 -1 0 0 0 -3 2-4ring2.dat
  [1,16,0,8,0,3,0,0,0,-1,0,0,0,-3, ldraw_lib__2_4ring2()],
// 0 BFC INVERTNEXT
  [0,"BFC","INVERTNEXT"],
// 1 16 0 5 0 0 0 6 -3 0 0 0 6 0 box3u7a.dat
  [1,16,0,5,0,0,0,6,-3,0,0,0,6,0, ldraw_lib__box3u7a()],
// 0 BFC INVERTNEXT
  [0,"BFC","INVERTNEXT"],
// 1 16 0 2 0 6 0 0 0 6 0 0 0 -6 2-4cyli.dat
  [1,16,0,2,0,6,0,0,0,6,0,0,0,-6, ldraw_lib__2_4cyli()],
// 1 16 0 8 0 6 0 0 0 1 0 0 0 -6 2-4edge.dat
  [1,16,0,8,0,6,0,0,0,1,0,0,0,-6, ldraw_lib__2_4edge()],
// 
// 0 BFC INVERTNEXT
  [0,"BFC","INVERTNEXT"],
// 1 16 0 2 0 6 0 0 0 -6 0 0 0 -6 2-8sphe.dat
  [1,16,0,2,0,6,0,0,0,-6,0,0,0,-6, ldraw_lib__2_8sphe()],
// 1 16 0 7.5 0 0 0 9 .5 0 0 0 9 0 box3u4a.dat
  [1,16,0,7.5,0,0,0,9,.5,0,0,0,9,0, ldraw_lib__box3u4a()],
// 1 16 0 7 0 9 0 0 0 1 0 0 0 -9 2-4cylo.dat
  [1,16,0,7,0,9,0,0,0,1,0,0,0,-9, ldraw_lib__2_4cylo()],
// 4 16 -10 7 0 -10 7 10 -9 7 9 -9 7 0
  [4,16,-10,7,0,-10,7,10,-9,7,9,-9,7,0],
// 4 16 -10 7 10 10 7 10 9 7 9 -9 7 9
  [4,16,-10,7,10,10,7,10,9,7,9,-9,7,9],
// 4 16 10 7 10 10 7 0 9 7 0 9 7 9
  [4,16,10,7,10,10,7,0,9,7,0,9,7,9],
// 1 16 0 7 0 1 0 0 0 -1 0 0 0 -1 2-4ring9.dat
  [1,16,0,7,0,1,0,0,0,-1,0,0,0,-1, ldraw_lib__2_4ring9()],
// 1 16 0 4.5 0 0 0 -10 -2.5 0 0 0 10 0 box3u7a.dat
  [1,16,0,4.5,0,0,0,-10,-2.5,0,0,0,10,0, ldraw_lib__box3u7a()],
// 1 16 0 7 0 10 0 0 0 1 0 0 0 -10 2-4edge.dat
  [1,16,0,7,0,10,0,0,0,1,0,0,0,-10, ldraw_lib__2_4edge()],
// 1 16 0 2 0 10 0 0 0 5 0 0 0 -10 2-4cyli.dat
  [1,16,0,2,0,10,0,0,0,5,0,0,0,-10, ldraw_lib__2_4cyli()],
// 
// 1 16 0 2 10 10 0 0 0 0 -10 0 1 0 2-4edge.dat
  [1,16,0,2,10,10,0,0,0,0,-10,0,1,0, ldraw_lib__2_4edge()],
// 1 16 0 2 0 10 0 0 0 0 -10 0 10 0 2-4cyli.dat
  [1,16,0,2,0,10,0,0,0,0,-10,0,10,0, ldraw_lib__2_4cyli()],
// 0 BFC INVERTNEXT
  [0,"BFC","INVERTNEXT"],
// 1 16 0 2 0 6 0 0 0 0 -6 0 6 0 2-4cyli.dat
  [1,16,0,2,0,6,0,0,0,0,-6,0,6,0, ldraw_lib__2_4cyli()],
// 1 16 0 2 6 6 0 0 0 0 -6 0 1 0 2-4edge.dat
  [1,16,0,2,6,6,0,0,0,0,-6,0,1,0, ldraw_lib__2_4edge()],
// 1 16 0 2 0 10 0 0 0 0 -10 0 -10 0 2-8sphe.dat
  [1,16,0,2,0,10,0,0,0,0,-10,0,-10,0, ldraw_lib__2_8sphe()],
// 1 16 0 2 10 10 0 0 0 0 -10 0 -1 0 2-4chrd.dat
  [1,16,0,2,10,10,0,0,0,0,-10,0,-1,0, ldraw_lib__2_4chrd()],
// 1 16 0 2 6 6 0 0 0 0 -6 0 1 0 2-4chrd.dat
  [1,16,0,2,6,6,0,0,0,0,-6,0,1,0, ldraw_lib__2_4chrd()],
];
module ldraw_lib__7818(step=0, col=false, unit=2/5, alt=false, line=0.2, solid=!$preview)
    makepoly(ldraw_lib__7818(), step=step, col=col, unit=unit, alt=alt, line=line, solid=solid);
ldraw_lib__7818(line=0.2);
